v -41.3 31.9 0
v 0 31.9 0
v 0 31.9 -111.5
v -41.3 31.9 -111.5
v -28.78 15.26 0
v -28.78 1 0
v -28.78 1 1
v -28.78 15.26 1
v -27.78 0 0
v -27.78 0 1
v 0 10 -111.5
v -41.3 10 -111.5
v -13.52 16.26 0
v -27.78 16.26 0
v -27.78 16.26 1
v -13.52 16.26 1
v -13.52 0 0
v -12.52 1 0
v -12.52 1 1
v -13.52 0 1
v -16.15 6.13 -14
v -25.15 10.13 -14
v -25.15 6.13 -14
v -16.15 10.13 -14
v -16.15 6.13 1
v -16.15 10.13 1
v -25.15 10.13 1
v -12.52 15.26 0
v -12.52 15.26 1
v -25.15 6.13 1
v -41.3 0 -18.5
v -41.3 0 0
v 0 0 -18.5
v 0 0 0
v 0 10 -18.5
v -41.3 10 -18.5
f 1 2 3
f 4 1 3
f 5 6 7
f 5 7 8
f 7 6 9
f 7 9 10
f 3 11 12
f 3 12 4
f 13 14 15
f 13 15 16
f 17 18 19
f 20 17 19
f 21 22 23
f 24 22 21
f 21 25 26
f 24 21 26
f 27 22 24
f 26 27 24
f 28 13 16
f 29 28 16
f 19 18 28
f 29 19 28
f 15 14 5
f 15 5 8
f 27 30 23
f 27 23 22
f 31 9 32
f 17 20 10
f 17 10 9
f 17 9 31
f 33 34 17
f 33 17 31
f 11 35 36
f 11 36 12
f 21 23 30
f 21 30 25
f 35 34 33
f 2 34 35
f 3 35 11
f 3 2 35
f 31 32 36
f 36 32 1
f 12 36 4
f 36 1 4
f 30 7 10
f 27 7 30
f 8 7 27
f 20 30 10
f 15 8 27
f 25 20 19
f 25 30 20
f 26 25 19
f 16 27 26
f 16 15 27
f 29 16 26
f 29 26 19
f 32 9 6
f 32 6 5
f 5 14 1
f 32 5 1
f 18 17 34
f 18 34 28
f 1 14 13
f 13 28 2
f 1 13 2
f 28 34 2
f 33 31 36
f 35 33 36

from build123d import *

# Parameters (mm, degrees)
SKETCH1_W           = 111.5
SKETCH1_H           = 31.9
BOSS_EXTRUDE1_DEPTH = 41.3
SKETCH2_W           = 93
SKETCH2_H           = 10
CUT_EXTRUDE1_DEPTH  = 124.10787952
SKETCH3_W           = 16.26
SKETCH3_H           = 16.26
BOSS_EXTRUDE2_DEPTH = 1
SKETCH4_W           = 9
SKETCH4_H           = 4
CUT_EXTRUDE2_DEPTH  = 15
CHAMFER1_SIZE       = 1


with BuildPart() as part:
    # Sketch1 → Boss-Extrude1 (new body)
    with BuildSketch(Plane(origin=(0, 0, 0), x_dir=(0, 0, -1), z_dir=(1, 0, 0))):
        with Locations((55.75, 15.95)):
            Rectangle(SKETCH1_W, SKETCH1_H)
    extrude(amount=-BOSS_EXTRUDE1_DEPTH)

    # Sketch2 → Cut-Extrude1 (cut, through all)
    with BuildSketch(Plane(origin=(0, 0, 0), x_dir=(0, 0, -1), z_dir=(1, 0, 0))):
        with Locations((65, 5)):
            Rectangle(SKETCH2_W, SKETCH2_H)
    extrude(amount=-CUT_EXTRUDE1_DEPTH, mode=Mode.SUBTRACT)

    # Sketch3 → Boss-Extrude2 (add)
    with BuildSketch(Plane.XY):
        with Locations((-20.65, 8.13)):
            Rectangle(SKETCH3_W, SKETCH3_H)
    extrude(amount=BOSS_EXTRUDE2_DEPTH)

    # Sketch4 → Cut-Extrude2 (cut)
    with BuildSketch(Plane.XY.offset(1)):
        with Locations((-20.65, 8.13)):
            Rectangle(SKETCH4_W, SKETCH4_H)
    extrude(amount=-CUT_EXTRUDE2_DEPTH, mode=Mode.SUBTRACT)

    # Chamfer1
    chamfer1_edges = [part.edges().sort_by_distance(p)[0] for p in [
        (-12.52, 0, 0.5),
        (-12.52, 16.26, 0.5),
        (-28.78, 16.26, 0.5),
        (-28.78, 0, 0.5),
    ]]
    chamfer(chamfer1_edges, length=CHAMFER1_SIZE)


solid = part.part
